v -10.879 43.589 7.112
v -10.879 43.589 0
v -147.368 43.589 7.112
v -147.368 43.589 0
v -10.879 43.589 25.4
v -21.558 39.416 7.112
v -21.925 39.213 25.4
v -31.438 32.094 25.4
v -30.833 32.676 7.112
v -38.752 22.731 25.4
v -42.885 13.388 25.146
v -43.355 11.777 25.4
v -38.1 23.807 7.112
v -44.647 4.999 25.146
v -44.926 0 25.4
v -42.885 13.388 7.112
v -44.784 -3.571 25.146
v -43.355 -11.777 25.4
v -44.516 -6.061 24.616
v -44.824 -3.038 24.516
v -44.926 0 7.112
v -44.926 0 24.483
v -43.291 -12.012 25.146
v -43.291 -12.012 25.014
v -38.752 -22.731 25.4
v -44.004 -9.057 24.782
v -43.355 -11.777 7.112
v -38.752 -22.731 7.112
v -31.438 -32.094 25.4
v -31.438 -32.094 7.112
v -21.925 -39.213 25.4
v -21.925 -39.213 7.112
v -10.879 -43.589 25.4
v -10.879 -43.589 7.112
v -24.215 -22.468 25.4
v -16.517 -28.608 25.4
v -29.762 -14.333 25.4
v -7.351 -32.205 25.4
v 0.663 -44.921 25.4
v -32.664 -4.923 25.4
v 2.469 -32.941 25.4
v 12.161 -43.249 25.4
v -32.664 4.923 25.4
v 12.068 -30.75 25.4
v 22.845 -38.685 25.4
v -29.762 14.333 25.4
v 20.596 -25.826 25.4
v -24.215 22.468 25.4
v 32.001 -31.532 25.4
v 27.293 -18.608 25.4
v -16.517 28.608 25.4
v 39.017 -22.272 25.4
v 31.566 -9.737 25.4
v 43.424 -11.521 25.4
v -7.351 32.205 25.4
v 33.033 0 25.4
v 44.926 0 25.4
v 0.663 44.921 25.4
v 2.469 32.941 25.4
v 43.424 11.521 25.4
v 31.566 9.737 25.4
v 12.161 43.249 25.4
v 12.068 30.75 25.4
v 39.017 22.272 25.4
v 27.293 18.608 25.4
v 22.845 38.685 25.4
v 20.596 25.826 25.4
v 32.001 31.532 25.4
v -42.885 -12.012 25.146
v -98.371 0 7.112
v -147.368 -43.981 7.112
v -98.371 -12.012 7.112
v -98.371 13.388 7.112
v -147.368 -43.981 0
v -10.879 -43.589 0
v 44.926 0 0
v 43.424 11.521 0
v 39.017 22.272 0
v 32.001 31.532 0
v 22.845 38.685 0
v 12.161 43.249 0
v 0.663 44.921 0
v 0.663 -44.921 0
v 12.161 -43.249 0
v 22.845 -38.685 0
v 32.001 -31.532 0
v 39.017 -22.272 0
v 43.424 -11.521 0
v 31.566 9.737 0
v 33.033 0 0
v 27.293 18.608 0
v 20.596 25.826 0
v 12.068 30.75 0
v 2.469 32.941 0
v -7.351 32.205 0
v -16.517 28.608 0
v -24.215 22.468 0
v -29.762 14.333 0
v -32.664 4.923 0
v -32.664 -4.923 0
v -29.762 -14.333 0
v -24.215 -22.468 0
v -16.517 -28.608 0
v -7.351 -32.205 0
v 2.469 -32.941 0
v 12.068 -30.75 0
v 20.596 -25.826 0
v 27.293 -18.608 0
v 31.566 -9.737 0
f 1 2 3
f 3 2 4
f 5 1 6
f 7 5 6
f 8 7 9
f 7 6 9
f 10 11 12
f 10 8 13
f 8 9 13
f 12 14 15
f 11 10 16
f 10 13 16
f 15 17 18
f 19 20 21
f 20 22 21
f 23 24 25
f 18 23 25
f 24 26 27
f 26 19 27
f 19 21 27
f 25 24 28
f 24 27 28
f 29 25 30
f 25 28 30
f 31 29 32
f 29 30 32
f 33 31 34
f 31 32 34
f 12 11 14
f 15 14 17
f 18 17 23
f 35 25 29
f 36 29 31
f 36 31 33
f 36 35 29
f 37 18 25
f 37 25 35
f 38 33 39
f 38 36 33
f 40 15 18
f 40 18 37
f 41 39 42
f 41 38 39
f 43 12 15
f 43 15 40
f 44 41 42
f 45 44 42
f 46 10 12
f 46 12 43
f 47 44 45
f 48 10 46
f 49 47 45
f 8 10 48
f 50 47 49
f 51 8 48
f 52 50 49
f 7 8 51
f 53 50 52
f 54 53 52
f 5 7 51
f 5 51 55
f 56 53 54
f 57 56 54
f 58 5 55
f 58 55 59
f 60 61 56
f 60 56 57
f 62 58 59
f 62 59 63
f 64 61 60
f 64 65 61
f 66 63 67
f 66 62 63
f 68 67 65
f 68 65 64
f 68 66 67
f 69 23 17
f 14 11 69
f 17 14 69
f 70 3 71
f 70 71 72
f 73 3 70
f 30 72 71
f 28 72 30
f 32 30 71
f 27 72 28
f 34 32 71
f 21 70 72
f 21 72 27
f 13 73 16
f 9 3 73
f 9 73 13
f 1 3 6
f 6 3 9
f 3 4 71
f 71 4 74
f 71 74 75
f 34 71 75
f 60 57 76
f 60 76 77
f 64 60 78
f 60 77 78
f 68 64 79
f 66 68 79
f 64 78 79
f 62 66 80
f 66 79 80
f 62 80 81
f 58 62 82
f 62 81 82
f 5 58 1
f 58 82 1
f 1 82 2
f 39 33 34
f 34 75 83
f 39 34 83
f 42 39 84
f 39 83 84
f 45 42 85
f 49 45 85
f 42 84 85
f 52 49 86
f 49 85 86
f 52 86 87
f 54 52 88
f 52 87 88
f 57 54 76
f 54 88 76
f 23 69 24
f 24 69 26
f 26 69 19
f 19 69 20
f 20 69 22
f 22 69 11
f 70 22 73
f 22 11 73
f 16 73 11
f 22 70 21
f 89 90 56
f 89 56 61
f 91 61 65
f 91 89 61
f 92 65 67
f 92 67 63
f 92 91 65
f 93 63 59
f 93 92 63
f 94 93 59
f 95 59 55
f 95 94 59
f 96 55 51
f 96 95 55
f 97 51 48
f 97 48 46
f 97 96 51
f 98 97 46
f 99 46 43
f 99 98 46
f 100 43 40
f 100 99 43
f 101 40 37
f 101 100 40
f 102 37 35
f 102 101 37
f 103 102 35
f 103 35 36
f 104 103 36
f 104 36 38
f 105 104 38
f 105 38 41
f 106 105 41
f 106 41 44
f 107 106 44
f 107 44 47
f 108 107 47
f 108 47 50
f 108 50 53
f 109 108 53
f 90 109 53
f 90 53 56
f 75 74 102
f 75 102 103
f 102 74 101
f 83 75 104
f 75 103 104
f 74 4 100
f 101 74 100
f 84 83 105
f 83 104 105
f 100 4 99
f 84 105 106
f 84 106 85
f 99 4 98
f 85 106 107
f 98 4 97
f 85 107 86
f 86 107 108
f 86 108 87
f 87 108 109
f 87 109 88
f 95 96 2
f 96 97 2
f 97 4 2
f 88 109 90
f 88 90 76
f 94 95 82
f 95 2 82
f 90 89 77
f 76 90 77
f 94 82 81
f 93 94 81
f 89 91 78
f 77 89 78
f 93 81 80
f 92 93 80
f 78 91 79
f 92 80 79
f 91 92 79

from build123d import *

# Parameters (mm, degrees)
F0_R     = 33.0333203714
F1_DEPTH = 25.4
F2_DEPTH = 7.112
F3_W     = 55.4855957025
F3_H     = 13.38801522
F4_DEPTH = 18.034
F7_DEPTH = 25.4


# Not quite as in the source:
# - a feature names something its author has since deleted; it is built from what else it names


with BuildPart() as f1:
    # F0 (on Top) → F1 (new body)
    with BuildSketch(Plane.XY):
        with BuildLine():
            ThreePointArc((-10.8790392065, -43.5892733327), (27.6552215769, -35.4057476022), (44.9263646842, 0))
            ThreePointArc((44.9263646842, 0), (27.6552215769, 35.4057476022), (-10.8790392065, 43.5892733327))
            ThreePointArc((-10.8790392065, 43.5892733327), (-44.9263646842, 0), (-10.8790392065, -43.5892733327))
        make_face()
        Circle(F0_R, mode=Mode.SUBTRACT)
    extrude(amount=F1_DEPTH)

    # F0 (on Top) → F2 (join)
    with BuildSketch(Plane.XY):
        with BuildLine():
            ThreePointArc((-10.8790392065, -43.5892733327), (27.6552215769, -35.4057476022), (44.9263646842, 0))
            ThreePointArc((44.9263646842, 0), (27.6552215769, 35.4057476022), (-10.8790392065, 43.5892733327))
            ThreePointArc((-10.8790392065, 43.5892733327), (-44.9263646842, 0), (-10.8790392065, -43.5892733327))
        make_face()
        Circle(F0_R, mode=Mode.SUBTRACT)
        with BuildLine():
            ThreePointArc((-10.8790392065, -43.5892733327), (-44.9263646842, 0), (-10.8790392065, 43.5892733327))
            Line((-10.8790392065, 43.5892733327), (-147.3678201437, 43.5892733327))
            Line((-147.3678201437, 43.5892733327), (-147.3678201437, -43.9813993871))
            Line((-147.3678201437, -43.9813993871), (-10.8790392065, -43.5892733327))
        make_face()
    extrude(amount=F2_DEPTH)

    # F3 (on face) → F4 (join)
    with BuildSketch(Plane.XY.offset(7.112)):
        with Locations((-70.6279851798, 6.69400761)):
            Rectangle(F3_W, F3_H)
    extrude(amount=F4_DEPTH)

    # F5 (on face) → F7 (cut)
    with BuildSketch(Plane(origin=(0, 13.38801522, 0), x_dir=(-1, 0, 0), z_dir=(0, 1, 0))):
        Polygon((42.8851873285, 25.146), (98.370783031, 7.112), (98.370783031, 25.146), align=None)
    extrude(amount=-F7_DEPTH, mode=Mode.SUBTRACT)


solid = f1.part
